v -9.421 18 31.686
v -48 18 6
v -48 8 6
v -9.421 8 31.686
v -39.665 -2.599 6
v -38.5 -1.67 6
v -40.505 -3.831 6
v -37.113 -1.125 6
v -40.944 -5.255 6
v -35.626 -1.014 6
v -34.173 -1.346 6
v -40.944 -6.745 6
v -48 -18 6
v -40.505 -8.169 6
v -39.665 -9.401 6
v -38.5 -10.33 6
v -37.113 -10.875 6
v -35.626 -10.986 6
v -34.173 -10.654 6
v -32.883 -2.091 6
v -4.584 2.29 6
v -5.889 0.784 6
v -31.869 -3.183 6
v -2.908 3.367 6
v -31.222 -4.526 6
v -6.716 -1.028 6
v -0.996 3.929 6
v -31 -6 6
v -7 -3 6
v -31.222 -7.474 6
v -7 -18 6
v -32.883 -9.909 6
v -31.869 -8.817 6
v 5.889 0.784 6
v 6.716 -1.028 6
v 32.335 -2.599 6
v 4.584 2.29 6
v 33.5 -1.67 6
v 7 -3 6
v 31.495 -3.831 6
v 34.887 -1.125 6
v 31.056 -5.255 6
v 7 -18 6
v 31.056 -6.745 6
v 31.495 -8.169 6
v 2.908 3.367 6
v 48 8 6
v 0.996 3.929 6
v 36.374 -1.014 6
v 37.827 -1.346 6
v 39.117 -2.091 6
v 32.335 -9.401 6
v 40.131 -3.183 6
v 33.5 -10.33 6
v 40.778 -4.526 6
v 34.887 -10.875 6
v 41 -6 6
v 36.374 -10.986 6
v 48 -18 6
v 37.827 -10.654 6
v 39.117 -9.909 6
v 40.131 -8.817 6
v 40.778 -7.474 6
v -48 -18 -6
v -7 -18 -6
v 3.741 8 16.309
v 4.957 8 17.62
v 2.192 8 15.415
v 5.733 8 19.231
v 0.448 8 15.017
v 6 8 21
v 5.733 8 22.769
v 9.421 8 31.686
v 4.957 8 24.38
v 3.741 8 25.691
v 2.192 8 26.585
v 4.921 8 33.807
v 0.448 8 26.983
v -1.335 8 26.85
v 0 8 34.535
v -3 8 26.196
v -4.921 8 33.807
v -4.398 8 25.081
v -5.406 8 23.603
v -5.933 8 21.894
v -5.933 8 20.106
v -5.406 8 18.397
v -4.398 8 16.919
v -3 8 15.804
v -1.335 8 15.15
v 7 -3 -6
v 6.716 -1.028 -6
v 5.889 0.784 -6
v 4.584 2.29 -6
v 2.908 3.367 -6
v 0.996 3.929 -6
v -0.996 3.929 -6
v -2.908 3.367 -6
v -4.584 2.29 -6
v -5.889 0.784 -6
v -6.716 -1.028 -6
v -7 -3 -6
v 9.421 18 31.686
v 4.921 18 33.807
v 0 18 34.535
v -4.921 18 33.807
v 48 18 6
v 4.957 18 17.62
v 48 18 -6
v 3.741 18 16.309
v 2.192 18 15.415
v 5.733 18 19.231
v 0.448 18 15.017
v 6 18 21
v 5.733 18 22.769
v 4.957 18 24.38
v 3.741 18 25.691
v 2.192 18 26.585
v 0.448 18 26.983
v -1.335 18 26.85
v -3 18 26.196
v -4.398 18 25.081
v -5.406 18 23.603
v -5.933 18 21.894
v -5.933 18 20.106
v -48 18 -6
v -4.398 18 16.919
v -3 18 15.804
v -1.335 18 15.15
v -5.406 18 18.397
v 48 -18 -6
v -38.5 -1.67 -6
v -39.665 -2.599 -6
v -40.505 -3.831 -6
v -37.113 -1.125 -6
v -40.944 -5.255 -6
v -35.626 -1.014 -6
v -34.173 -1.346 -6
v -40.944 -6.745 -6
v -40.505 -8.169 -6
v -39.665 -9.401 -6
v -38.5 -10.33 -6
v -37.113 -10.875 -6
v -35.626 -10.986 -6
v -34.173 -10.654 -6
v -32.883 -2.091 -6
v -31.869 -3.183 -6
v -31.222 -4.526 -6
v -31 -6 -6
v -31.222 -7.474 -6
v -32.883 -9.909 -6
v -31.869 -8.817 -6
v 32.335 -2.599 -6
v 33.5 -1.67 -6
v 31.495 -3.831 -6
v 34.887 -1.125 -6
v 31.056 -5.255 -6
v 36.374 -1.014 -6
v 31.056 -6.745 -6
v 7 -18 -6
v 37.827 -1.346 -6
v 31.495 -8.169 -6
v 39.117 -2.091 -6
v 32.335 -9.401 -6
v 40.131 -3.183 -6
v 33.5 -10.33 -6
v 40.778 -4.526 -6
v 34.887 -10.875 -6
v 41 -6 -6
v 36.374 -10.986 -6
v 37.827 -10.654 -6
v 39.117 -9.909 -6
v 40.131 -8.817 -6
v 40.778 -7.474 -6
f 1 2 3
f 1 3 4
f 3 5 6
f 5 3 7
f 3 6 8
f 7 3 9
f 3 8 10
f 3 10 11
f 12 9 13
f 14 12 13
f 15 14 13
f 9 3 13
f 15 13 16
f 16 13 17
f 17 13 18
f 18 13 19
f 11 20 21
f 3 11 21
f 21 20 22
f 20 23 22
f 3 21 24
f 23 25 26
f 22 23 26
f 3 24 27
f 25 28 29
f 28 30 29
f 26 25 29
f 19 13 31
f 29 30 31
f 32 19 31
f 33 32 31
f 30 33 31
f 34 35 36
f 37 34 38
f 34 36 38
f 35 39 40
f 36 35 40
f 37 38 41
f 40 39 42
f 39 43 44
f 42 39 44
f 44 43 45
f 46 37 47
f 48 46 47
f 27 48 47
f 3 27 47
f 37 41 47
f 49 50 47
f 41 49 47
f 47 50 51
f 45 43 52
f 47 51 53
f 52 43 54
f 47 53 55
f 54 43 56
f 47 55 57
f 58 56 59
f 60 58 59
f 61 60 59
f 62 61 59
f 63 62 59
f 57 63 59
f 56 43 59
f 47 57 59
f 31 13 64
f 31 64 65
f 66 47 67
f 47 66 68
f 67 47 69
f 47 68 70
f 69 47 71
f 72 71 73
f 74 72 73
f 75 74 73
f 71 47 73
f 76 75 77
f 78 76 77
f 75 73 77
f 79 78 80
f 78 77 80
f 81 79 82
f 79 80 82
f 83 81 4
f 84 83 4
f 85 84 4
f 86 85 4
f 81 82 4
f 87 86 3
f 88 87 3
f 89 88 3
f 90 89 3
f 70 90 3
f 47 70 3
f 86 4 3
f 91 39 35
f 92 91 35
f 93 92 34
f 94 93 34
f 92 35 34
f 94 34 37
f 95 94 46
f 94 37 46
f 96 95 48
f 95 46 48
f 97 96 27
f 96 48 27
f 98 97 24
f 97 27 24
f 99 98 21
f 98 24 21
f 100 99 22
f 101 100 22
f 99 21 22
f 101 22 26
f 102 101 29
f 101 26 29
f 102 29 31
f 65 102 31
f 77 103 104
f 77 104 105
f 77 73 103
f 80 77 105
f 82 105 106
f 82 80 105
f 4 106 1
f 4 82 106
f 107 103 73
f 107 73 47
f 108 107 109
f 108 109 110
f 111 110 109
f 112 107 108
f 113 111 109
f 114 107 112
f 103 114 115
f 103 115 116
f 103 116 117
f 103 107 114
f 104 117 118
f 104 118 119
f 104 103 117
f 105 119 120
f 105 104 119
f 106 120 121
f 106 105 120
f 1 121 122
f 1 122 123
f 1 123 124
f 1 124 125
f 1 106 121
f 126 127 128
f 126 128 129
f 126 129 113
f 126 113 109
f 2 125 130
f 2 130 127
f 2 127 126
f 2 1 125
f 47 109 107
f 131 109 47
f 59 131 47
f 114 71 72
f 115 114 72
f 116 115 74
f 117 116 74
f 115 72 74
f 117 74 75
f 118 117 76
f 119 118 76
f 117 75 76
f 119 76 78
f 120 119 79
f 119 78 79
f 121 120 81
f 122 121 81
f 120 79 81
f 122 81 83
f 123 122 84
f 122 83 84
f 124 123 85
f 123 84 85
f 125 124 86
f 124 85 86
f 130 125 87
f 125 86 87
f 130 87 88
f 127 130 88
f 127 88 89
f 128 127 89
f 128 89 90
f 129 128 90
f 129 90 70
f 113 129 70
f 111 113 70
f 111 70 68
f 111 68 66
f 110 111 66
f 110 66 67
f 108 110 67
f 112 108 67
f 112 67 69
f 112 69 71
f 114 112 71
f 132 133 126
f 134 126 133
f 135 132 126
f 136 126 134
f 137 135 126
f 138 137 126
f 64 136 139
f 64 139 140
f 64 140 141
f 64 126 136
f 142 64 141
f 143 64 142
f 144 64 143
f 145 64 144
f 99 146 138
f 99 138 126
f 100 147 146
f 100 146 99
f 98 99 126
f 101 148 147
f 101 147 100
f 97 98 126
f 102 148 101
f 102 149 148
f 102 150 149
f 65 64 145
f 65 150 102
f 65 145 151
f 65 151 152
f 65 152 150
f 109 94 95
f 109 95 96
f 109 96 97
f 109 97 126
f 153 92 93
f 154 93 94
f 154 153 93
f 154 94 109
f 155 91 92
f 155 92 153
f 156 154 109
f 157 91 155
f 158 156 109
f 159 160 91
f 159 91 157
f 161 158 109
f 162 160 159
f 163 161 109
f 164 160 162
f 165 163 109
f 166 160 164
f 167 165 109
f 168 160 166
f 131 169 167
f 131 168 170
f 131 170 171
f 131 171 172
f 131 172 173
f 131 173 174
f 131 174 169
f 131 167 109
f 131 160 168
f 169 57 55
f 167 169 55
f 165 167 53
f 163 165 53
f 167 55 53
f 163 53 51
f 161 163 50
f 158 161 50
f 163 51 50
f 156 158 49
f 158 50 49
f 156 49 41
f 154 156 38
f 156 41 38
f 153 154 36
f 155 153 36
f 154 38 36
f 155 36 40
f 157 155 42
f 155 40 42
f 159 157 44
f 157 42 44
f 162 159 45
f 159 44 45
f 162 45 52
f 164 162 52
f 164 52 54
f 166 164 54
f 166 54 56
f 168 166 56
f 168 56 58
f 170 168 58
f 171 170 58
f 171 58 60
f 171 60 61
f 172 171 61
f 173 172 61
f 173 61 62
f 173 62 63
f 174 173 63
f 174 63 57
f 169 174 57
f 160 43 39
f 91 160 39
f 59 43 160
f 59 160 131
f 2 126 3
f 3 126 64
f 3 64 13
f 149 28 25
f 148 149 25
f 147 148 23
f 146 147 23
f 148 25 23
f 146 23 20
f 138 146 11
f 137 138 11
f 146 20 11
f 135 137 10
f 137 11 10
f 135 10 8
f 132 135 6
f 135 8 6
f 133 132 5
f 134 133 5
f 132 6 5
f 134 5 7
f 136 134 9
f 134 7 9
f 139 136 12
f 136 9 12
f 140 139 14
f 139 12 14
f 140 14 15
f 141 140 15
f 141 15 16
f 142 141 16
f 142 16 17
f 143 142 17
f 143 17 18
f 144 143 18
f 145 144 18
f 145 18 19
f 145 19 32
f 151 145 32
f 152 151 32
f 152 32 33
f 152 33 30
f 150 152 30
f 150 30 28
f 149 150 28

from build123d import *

# Parameters (mm, degrees)
F0_W      = 96
F0_H      = 12
F1_DEPTH  = 18
F3_DEPTH  = 10
F4_R      = 17
F5_R      = 6
F6_DEPTH  = 10.001
F7_W      = 14
F7_H      = 15
F8_DEPTH  = 25
F9_R      = 7
F10_DEPTH = 25
F11_R     = 5
F12_DEPTH = 12.001


with BuildPart() as f1:
    # F0 (on Front) → F1 (new body, symmetric)
    with BuildSketch(Plane.XZ):
        Rectangle(F0_W, F0_H)
    extrude(amount=F1_DEPTH, both=True)

    # F2 (on face) → F3 (join)
    with BuildSketch(Plane(origin=(0, 18, 0), x_dir=(-1, 0, 0), z_dir=(0, 1, 0))):
        Polygon((0, 37.958633), (-48, 6), (48, 6), align=None)
    extrude(amount=-F3_DEPTH)

    # F4
    f4_edges = [f1.edges().sort_by_distance(p)[0] for p in [
        (0, 13, 37.958633),
    ]]
    fillet(f4_edges, radius=F4_R)

    # F5 (on face) → F6 (cut, through all)
    with BuildSketch(Plane.XZ.offset(-8)):
        with Locations((0, 21)):
            Circle(F5_R)
    extrude(amount=-F6_DEPTH, mode=Mode.SUBTRACT)

    # F7 (on face) → F8 (cut)
    with BuildSketch(Plane.XY.offset(6)):
        with Locations((0, -10.5)):
            Rectangle(F7_W, F7_H)
        with Locations((0, -25.5)):
            Rectangle(F7_W, F7_H)
    extrude(amount=-F8_DEPTH, mode=Mode.SUBTRACT)

    # F9 (on face) → F10 (cut)
    with BuildSketch(Plane.XY.offset(6)):
        with Locations((0, -3)):
            Circle(F9_R)
    extrude(amount=-F10_DEPTH, mode=Mode.SUBTRACT)

    # F11 (on face) → F12 (cut, through all)
    with BuildSketch(Plane.XY.offset(6)):
        with Locations((36, -6)):
            Circle(F11_R)
        with Locations((-36, -6)):
            Circle(F11_R)
    extrude(amount=-F12_DEPTH, mode=Mode.SUBTRACT)


solid = f1.part
